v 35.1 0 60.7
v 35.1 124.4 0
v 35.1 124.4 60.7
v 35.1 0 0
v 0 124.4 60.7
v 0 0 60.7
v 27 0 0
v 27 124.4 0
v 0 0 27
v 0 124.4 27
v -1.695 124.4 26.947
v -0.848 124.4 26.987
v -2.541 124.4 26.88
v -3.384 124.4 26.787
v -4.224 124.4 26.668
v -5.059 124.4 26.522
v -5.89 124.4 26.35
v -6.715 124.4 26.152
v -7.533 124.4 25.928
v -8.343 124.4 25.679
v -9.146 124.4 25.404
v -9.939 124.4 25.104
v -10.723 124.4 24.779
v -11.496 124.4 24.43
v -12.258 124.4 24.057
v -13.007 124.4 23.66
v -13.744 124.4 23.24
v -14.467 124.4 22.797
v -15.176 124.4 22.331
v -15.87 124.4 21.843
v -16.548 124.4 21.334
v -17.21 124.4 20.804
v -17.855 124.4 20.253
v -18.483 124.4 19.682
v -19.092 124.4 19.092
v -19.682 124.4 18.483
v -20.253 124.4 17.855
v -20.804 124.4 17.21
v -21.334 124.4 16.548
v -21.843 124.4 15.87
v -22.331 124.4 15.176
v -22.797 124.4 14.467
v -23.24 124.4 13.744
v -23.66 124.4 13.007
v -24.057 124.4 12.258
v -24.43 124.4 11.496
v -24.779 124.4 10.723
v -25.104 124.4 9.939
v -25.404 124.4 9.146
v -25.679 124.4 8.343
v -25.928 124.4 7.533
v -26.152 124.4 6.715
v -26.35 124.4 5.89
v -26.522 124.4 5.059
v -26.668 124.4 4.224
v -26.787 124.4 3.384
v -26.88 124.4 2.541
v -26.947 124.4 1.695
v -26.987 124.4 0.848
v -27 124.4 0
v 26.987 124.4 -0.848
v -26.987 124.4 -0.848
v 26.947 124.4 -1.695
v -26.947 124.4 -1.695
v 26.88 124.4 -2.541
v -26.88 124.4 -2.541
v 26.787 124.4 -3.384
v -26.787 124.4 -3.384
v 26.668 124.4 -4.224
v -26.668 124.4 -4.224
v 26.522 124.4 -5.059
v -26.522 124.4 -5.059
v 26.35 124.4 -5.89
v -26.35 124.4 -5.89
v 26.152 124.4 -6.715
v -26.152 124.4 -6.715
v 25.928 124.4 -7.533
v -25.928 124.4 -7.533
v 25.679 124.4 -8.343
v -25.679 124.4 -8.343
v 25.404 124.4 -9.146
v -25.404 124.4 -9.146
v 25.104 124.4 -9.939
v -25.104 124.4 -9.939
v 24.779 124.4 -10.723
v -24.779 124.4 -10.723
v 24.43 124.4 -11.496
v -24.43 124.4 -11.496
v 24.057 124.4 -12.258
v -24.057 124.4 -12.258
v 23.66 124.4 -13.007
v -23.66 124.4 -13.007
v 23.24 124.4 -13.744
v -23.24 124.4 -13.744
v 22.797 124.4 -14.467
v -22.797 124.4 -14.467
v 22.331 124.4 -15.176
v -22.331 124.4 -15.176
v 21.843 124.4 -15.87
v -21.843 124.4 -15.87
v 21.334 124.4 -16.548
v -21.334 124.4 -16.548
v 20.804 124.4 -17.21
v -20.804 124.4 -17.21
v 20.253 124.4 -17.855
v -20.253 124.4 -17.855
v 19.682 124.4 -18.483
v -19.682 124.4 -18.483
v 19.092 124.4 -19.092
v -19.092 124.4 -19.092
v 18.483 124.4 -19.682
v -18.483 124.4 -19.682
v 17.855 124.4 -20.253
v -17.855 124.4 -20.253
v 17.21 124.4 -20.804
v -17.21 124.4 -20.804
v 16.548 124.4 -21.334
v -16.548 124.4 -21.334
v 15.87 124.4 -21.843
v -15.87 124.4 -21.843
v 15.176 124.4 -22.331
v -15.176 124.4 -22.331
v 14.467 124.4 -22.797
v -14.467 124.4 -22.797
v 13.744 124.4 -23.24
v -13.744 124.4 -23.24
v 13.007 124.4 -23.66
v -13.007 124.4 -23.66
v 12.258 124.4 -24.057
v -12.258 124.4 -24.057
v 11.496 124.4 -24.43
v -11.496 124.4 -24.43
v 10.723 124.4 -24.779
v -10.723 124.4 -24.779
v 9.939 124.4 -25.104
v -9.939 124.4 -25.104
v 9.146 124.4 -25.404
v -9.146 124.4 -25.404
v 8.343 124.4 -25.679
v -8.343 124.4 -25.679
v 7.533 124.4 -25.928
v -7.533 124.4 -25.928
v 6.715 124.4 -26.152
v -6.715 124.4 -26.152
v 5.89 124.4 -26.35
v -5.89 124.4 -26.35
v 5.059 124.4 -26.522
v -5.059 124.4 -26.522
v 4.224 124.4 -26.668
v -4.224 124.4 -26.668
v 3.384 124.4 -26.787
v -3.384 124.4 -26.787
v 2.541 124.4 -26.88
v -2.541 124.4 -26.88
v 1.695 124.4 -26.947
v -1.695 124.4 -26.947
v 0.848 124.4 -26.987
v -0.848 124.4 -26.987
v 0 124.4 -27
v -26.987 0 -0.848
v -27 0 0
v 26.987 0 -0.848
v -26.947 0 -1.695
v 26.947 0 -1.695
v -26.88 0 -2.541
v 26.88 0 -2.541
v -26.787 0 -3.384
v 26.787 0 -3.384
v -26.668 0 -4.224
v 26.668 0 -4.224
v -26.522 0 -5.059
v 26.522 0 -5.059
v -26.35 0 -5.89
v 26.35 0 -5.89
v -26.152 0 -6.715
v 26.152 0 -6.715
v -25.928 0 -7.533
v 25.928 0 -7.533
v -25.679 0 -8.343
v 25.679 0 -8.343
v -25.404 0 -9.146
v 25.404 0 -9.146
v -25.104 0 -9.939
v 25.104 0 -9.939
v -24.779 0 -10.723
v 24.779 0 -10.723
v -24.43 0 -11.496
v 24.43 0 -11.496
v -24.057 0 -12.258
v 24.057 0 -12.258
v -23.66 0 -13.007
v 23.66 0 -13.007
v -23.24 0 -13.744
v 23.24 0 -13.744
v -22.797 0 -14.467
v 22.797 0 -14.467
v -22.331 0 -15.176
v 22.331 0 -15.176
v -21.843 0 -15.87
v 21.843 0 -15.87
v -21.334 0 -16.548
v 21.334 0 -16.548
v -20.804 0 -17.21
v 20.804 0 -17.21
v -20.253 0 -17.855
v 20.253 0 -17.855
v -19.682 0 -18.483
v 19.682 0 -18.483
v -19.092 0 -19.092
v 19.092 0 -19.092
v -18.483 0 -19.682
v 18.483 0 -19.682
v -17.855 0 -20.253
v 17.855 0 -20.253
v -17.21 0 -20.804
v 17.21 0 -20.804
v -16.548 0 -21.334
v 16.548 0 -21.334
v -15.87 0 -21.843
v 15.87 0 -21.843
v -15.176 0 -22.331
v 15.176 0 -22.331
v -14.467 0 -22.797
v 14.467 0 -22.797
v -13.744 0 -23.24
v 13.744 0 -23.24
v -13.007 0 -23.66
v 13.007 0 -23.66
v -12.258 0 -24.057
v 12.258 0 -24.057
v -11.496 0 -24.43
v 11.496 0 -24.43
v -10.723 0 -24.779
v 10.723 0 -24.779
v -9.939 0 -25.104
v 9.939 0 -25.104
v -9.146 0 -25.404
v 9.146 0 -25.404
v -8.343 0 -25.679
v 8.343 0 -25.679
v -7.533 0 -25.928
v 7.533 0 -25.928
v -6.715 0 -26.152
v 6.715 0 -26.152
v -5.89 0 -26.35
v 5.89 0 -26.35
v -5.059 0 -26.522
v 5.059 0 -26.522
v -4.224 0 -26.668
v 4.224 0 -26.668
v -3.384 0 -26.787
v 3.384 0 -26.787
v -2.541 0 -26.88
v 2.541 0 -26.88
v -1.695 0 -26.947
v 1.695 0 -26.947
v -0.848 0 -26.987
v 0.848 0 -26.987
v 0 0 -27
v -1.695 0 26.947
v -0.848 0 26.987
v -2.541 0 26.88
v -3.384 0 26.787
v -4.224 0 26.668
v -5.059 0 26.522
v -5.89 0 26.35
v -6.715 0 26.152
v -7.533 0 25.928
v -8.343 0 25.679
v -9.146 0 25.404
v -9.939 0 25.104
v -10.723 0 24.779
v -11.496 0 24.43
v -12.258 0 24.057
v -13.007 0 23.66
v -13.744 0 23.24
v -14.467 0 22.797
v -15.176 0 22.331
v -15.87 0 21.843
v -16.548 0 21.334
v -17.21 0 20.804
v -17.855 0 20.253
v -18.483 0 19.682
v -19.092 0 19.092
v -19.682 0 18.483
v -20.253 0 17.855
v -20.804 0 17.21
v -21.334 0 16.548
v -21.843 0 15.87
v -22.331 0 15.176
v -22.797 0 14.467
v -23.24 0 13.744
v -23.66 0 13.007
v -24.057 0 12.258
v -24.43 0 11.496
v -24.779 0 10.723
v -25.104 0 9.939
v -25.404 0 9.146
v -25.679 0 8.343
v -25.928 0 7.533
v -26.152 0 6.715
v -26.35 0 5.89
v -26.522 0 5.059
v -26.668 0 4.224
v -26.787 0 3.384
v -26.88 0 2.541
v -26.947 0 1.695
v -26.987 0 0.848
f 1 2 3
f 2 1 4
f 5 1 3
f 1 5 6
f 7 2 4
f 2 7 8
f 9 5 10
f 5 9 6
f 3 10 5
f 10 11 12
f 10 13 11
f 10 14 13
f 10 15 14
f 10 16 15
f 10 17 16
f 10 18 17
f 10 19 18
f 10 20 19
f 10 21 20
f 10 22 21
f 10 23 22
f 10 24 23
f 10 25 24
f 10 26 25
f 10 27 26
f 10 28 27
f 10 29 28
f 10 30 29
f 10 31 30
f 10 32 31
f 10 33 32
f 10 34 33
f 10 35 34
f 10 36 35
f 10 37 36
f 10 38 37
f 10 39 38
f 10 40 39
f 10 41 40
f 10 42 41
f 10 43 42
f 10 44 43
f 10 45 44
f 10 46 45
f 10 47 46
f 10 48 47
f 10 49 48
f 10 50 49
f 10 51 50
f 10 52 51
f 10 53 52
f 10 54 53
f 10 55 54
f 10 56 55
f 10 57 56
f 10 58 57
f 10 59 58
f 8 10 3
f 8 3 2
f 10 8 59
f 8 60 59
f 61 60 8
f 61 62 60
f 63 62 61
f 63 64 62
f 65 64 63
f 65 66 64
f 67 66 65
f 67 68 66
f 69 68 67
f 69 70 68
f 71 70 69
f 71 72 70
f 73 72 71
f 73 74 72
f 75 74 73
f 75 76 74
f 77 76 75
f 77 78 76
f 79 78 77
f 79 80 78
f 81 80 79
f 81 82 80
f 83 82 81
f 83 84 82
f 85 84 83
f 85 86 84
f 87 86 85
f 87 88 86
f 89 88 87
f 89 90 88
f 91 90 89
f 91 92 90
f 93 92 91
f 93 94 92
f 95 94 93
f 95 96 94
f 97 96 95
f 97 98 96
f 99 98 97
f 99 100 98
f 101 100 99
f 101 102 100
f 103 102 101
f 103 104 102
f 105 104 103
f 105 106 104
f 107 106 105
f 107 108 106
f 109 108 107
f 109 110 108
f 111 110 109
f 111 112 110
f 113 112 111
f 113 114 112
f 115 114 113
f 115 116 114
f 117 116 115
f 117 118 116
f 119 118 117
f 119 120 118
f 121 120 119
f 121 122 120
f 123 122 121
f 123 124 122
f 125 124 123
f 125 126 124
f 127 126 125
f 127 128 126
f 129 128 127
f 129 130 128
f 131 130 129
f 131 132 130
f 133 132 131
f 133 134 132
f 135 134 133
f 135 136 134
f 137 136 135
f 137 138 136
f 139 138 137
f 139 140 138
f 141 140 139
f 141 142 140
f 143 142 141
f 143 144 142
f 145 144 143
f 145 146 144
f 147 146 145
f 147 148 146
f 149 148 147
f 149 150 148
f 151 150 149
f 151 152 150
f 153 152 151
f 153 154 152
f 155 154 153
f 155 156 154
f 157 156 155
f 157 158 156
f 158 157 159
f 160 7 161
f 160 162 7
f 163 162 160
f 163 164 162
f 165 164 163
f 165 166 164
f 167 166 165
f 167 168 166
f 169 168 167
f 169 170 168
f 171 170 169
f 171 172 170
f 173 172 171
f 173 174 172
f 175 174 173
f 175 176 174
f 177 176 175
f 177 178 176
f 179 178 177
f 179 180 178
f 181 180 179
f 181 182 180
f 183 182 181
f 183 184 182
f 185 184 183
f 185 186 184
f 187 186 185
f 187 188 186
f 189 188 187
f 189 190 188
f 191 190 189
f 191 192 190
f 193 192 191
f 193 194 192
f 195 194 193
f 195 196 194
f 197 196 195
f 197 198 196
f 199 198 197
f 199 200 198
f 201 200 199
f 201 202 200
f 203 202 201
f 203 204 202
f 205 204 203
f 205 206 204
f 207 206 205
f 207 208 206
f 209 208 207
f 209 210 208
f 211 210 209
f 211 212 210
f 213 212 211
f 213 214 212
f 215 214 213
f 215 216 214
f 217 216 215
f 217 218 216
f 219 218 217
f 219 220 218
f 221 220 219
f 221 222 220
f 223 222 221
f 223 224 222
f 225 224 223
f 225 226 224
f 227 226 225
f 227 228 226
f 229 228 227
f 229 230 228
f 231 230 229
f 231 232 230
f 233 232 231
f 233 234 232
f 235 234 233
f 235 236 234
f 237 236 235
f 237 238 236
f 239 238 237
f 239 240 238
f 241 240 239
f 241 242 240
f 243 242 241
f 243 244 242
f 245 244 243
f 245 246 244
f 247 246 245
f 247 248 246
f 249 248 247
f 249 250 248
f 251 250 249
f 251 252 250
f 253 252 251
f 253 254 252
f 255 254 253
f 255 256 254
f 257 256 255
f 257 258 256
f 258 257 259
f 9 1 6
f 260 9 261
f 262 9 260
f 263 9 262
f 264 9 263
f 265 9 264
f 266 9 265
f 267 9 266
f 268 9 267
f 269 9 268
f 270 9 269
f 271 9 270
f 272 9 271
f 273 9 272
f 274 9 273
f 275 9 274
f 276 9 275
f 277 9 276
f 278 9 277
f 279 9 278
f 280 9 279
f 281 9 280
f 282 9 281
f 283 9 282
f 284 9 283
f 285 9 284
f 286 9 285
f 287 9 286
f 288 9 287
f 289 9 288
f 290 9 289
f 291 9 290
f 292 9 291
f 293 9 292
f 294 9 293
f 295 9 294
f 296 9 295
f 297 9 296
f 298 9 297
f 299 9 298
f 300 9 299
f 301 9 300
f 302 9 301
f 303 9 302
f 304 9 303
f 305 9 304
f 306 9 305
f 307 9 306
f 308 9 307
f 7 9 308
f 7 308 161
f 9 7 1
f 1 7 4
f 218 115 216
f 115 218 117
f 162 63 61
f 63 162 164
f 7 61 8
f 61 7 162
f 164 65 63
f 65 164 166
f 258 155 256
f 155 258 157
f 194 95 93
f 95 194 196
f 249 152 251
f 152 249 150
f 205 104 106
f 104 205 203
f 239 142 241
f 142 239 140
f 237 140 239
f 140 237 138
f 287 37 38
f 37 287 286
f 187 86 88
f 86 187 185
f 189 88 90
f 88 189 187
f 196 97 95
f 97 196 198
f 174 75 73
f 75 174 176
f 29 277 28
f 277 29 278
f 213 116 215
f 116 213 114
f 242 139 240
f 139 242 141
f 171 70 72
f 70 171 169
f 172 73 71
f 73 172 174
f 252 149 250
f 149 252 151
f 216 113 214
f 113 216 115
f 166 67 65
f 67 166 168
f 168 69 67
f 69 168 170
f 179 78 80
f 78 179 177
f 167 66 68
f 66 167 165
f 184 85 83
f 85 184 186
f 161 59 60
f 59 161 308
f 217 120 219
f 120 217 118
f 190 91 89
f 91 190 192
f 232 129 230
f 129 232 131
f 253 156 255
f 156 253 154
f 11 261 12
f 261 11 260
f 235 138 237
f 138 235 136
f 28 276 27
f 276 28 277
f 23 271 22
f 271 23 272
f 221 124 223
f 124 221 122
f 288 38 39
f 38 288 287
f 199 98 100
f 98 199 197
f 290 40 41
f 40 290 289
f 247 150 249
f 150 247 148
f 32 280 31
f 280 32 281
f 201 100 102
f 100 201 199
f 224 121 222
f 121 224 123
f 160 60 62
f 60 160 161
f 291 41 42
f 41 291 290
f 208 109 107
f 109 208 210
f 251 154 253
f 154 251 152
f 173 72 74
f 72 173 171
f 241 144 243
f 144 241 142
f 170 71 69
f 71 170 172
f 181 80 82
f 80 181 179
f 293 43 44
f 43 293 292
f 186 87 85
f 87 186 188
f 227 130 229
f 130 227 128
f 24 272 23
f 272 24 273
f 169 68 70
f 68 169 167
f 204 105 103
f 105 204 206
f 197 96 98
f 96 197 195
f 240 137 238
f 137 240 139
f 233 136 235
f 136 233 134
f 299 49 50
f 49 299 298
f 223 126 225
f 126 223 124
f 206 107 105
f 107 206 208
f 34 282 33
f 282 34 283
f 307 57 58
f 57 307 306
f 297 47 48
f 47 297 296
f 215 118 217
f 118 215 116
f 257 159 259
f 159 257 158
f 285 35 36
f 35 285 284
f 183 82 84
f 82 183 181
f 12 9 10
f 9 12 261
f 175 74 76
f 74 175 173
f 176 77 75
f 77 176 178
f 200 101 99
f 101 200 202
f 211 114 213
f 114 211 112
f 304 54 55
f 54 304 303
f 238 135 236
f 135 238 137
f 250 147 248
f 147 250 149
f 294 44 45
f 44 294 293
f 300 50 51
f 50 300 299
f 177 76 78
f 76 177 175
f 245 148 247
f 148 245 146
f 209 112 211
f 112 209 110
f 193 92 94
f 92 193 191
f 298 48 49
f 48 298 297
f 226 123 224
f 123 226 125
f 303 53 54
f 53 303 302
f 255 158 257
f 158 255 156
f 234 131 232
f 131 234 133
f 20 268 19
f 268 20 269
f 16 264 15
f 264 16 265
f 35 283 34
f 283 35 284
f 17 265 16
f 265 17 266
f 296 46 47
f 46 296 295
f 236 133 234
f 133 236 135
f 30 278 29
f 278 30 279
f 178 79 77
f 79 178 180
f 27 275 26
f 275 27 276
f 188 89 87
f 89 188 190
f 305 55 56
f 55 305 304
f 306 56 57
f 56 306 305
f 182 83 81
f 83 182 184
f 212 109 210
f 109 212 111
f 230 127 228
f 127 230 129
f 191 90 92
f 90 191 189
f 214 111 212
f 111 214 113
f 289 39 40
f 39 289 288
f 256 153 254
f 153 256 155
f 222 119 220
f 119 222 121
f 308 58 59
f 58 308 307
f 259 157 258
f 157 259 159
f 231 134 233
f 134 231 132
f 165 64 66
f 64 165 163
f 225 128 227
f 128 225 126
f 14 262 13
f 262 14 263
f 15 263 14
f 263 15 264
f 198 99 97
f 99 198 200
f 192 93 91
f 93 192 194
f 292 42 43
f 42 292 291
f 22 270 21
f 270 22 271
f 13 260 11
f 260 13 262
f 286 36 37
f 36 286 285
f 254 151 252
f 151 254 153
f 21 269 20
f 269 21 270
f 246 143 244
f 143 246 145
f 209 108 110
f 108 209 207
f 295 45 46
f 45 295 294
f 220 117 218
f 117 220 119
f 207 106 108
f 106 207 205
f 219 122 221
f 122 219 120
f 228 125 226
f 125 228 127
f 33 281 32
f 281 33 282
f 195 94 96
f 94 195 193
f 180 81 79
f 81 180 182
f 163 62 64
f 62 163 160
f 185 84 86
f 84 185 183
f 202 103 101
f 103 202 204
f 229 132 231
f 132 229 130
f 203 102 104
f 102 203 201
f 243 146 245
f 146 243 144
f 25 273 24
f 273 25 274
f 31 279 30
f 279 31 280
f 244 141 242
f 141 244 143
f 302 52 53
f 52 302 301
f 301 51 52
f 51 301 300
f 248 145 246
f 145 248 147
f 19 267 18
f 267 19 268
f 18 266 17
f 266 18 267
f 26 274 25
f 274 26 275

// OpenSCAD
$fn = 200;
part_w = 35.1;
part_d = 124.4;
part_h = 60.7;

sidewall_w = 11;

upper_track_w = 48.96;
middle_track_w = 32.47;
lower_track_w = 38.18;

grip_cyl_r = 20;
handstop_cyl_r = 27;

// Cube volume of one half of the pump
cube([part_w, part_d, part_h]);


rotate([-90,0,0]) cylinder(h=part_d, r=27);
